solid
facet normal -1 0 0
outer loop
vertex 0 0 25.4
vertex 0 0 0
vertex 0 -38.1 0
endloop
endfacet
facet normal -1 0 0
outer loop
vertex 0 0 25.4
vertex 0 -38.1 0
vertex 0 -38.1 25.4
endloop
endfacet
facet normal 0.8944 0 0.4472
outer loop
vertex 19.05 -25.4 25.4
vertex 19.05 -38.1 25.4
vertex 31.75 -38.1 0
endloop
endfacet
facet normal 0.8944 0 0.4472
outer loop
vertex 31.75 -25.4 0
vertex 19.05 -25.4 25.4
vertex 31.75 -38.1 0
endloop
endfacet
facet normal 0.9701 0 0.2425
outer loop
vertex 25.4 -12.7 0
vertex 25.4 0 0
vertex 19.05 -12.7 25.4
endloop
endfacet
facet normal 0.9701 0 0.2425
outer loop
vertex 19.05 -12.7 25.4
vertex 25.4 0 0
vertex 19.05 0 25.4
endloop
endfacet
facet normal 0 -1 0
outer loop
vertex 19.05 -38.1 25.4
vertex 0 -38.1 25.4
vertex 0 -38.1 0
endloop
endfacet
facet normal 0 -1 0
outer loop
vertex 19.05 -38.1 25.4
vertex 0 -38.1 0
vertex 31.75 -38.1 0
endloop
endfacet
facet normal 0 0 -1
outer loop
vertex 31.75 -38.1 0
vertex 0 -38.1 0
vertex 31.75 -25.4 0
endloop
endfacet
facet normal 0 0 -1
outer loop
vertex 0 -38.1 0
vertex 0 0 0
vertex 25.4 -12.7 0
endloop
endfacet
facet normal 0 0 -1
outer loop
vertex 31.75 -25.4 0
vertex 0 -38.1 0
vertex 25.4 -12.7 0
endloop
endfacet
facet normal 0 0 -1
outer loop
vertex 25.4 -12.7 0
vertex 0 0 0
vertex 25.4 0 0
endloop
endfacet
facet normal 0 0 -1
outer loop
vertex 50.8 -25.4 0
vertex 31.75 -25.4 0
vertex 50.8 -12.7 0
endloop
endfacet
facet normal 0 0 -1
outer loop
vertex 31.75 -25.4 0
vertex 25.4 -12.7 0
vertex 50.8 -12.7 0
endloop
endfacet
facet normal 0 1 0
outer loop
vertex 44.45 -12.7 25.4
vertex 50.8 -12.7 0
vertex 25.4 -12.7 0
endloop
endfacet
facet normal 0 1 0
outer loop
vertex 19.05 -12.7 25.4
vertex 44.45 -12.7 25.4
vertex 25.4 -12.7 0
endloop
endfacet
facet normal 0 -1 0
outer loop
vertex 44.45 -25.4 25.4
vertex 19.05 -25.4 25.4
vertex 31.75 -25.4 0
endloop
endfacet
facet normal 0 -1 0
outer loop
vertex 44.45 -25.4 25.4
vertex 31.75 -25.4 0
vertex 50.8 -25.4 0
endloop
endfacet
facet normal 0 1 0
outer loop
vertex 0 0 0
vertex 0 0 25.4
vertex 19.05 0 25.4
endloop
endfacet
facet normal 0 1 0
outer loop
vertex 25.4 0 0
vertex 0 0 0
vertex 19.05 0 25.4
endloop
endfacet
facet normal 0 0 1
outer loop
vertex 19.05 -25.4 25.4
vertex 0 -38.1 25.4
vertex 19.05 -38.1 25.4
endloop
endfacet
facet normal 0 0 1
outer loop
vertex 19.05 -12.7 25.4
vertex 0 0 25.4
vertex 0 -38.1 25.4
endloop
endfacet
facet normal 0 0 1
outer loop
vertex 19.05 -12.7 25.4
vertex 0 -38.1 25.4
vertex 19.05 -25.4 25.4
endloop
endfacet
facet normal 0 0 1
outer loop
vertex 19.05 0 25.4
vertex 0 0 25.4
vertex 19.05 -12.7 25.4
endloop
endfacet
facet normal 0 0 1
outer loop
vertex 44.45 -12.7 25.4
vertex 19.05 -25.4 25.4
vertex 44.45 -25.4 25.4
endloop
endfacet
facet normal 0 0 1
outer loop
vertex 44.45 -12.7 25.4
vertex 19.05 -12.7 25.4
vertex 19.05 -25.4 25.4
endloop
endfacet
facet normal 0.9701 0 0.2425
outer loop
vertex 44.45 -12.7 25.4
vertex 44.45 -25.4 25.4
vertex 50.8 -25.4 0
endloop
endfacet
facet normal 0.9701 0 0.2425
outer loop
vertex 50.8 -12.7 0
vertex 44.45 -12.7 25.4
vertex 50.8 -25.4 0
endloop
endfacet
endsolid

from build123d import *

# Parameters (mm, degrees)
F0_W     = 50.8
F0_H     = 25.4
F1_DEPTH = 38.1
F3_DEPTH = 12.7
F5_DEPTH = 25.4
F7_DEPTH = 12.7


with BuildPart() as f1:
    # F0 (on Front) → F1 (new body)
    with BuildSketch(Plane.XZ):
        with Locations((25.4, 12.7)):
            Rectangle(F0_W, F0_H)
    extrude(amount=F1_DEPTH)

    # F2 (on face) → F3 (cut)
    with BuildSketch(Plane.XZ.offset(38.1)):
        Polygon((19.05, 25.4), (31.75, 0), (50.8, 0), (50.8, 25.4), align=None)
    extrude(amount=-F3_DEPTH, mode=Mode.SUBTRACT)

    # F4 (on face) → F5 (cut)
    with BuildSketch(Plane.XZ.offset(25.4)):
        Polygon((50.8, 25.4), (44.45, 25.4), (50.8, 0), align=None)
    extrude(amount=-F5_DEPTH, mode=Mode.SUBTRACT)

    # F6 (on face) → F7 (cut)
    with BuildSketch(Plane(origin=(0, 0, 0), x_dir=(-1, 0, 0), z_dir=(0, 1, 0))):
        Polygon((-50.8, 0), (-25.4, 0), (-19.05, 25.4), (-44.45, 25.4), align=None)
    extrude(amount=-F7_DEPTH, mode=Mode.SUBTRACT)


solid = f1.part
